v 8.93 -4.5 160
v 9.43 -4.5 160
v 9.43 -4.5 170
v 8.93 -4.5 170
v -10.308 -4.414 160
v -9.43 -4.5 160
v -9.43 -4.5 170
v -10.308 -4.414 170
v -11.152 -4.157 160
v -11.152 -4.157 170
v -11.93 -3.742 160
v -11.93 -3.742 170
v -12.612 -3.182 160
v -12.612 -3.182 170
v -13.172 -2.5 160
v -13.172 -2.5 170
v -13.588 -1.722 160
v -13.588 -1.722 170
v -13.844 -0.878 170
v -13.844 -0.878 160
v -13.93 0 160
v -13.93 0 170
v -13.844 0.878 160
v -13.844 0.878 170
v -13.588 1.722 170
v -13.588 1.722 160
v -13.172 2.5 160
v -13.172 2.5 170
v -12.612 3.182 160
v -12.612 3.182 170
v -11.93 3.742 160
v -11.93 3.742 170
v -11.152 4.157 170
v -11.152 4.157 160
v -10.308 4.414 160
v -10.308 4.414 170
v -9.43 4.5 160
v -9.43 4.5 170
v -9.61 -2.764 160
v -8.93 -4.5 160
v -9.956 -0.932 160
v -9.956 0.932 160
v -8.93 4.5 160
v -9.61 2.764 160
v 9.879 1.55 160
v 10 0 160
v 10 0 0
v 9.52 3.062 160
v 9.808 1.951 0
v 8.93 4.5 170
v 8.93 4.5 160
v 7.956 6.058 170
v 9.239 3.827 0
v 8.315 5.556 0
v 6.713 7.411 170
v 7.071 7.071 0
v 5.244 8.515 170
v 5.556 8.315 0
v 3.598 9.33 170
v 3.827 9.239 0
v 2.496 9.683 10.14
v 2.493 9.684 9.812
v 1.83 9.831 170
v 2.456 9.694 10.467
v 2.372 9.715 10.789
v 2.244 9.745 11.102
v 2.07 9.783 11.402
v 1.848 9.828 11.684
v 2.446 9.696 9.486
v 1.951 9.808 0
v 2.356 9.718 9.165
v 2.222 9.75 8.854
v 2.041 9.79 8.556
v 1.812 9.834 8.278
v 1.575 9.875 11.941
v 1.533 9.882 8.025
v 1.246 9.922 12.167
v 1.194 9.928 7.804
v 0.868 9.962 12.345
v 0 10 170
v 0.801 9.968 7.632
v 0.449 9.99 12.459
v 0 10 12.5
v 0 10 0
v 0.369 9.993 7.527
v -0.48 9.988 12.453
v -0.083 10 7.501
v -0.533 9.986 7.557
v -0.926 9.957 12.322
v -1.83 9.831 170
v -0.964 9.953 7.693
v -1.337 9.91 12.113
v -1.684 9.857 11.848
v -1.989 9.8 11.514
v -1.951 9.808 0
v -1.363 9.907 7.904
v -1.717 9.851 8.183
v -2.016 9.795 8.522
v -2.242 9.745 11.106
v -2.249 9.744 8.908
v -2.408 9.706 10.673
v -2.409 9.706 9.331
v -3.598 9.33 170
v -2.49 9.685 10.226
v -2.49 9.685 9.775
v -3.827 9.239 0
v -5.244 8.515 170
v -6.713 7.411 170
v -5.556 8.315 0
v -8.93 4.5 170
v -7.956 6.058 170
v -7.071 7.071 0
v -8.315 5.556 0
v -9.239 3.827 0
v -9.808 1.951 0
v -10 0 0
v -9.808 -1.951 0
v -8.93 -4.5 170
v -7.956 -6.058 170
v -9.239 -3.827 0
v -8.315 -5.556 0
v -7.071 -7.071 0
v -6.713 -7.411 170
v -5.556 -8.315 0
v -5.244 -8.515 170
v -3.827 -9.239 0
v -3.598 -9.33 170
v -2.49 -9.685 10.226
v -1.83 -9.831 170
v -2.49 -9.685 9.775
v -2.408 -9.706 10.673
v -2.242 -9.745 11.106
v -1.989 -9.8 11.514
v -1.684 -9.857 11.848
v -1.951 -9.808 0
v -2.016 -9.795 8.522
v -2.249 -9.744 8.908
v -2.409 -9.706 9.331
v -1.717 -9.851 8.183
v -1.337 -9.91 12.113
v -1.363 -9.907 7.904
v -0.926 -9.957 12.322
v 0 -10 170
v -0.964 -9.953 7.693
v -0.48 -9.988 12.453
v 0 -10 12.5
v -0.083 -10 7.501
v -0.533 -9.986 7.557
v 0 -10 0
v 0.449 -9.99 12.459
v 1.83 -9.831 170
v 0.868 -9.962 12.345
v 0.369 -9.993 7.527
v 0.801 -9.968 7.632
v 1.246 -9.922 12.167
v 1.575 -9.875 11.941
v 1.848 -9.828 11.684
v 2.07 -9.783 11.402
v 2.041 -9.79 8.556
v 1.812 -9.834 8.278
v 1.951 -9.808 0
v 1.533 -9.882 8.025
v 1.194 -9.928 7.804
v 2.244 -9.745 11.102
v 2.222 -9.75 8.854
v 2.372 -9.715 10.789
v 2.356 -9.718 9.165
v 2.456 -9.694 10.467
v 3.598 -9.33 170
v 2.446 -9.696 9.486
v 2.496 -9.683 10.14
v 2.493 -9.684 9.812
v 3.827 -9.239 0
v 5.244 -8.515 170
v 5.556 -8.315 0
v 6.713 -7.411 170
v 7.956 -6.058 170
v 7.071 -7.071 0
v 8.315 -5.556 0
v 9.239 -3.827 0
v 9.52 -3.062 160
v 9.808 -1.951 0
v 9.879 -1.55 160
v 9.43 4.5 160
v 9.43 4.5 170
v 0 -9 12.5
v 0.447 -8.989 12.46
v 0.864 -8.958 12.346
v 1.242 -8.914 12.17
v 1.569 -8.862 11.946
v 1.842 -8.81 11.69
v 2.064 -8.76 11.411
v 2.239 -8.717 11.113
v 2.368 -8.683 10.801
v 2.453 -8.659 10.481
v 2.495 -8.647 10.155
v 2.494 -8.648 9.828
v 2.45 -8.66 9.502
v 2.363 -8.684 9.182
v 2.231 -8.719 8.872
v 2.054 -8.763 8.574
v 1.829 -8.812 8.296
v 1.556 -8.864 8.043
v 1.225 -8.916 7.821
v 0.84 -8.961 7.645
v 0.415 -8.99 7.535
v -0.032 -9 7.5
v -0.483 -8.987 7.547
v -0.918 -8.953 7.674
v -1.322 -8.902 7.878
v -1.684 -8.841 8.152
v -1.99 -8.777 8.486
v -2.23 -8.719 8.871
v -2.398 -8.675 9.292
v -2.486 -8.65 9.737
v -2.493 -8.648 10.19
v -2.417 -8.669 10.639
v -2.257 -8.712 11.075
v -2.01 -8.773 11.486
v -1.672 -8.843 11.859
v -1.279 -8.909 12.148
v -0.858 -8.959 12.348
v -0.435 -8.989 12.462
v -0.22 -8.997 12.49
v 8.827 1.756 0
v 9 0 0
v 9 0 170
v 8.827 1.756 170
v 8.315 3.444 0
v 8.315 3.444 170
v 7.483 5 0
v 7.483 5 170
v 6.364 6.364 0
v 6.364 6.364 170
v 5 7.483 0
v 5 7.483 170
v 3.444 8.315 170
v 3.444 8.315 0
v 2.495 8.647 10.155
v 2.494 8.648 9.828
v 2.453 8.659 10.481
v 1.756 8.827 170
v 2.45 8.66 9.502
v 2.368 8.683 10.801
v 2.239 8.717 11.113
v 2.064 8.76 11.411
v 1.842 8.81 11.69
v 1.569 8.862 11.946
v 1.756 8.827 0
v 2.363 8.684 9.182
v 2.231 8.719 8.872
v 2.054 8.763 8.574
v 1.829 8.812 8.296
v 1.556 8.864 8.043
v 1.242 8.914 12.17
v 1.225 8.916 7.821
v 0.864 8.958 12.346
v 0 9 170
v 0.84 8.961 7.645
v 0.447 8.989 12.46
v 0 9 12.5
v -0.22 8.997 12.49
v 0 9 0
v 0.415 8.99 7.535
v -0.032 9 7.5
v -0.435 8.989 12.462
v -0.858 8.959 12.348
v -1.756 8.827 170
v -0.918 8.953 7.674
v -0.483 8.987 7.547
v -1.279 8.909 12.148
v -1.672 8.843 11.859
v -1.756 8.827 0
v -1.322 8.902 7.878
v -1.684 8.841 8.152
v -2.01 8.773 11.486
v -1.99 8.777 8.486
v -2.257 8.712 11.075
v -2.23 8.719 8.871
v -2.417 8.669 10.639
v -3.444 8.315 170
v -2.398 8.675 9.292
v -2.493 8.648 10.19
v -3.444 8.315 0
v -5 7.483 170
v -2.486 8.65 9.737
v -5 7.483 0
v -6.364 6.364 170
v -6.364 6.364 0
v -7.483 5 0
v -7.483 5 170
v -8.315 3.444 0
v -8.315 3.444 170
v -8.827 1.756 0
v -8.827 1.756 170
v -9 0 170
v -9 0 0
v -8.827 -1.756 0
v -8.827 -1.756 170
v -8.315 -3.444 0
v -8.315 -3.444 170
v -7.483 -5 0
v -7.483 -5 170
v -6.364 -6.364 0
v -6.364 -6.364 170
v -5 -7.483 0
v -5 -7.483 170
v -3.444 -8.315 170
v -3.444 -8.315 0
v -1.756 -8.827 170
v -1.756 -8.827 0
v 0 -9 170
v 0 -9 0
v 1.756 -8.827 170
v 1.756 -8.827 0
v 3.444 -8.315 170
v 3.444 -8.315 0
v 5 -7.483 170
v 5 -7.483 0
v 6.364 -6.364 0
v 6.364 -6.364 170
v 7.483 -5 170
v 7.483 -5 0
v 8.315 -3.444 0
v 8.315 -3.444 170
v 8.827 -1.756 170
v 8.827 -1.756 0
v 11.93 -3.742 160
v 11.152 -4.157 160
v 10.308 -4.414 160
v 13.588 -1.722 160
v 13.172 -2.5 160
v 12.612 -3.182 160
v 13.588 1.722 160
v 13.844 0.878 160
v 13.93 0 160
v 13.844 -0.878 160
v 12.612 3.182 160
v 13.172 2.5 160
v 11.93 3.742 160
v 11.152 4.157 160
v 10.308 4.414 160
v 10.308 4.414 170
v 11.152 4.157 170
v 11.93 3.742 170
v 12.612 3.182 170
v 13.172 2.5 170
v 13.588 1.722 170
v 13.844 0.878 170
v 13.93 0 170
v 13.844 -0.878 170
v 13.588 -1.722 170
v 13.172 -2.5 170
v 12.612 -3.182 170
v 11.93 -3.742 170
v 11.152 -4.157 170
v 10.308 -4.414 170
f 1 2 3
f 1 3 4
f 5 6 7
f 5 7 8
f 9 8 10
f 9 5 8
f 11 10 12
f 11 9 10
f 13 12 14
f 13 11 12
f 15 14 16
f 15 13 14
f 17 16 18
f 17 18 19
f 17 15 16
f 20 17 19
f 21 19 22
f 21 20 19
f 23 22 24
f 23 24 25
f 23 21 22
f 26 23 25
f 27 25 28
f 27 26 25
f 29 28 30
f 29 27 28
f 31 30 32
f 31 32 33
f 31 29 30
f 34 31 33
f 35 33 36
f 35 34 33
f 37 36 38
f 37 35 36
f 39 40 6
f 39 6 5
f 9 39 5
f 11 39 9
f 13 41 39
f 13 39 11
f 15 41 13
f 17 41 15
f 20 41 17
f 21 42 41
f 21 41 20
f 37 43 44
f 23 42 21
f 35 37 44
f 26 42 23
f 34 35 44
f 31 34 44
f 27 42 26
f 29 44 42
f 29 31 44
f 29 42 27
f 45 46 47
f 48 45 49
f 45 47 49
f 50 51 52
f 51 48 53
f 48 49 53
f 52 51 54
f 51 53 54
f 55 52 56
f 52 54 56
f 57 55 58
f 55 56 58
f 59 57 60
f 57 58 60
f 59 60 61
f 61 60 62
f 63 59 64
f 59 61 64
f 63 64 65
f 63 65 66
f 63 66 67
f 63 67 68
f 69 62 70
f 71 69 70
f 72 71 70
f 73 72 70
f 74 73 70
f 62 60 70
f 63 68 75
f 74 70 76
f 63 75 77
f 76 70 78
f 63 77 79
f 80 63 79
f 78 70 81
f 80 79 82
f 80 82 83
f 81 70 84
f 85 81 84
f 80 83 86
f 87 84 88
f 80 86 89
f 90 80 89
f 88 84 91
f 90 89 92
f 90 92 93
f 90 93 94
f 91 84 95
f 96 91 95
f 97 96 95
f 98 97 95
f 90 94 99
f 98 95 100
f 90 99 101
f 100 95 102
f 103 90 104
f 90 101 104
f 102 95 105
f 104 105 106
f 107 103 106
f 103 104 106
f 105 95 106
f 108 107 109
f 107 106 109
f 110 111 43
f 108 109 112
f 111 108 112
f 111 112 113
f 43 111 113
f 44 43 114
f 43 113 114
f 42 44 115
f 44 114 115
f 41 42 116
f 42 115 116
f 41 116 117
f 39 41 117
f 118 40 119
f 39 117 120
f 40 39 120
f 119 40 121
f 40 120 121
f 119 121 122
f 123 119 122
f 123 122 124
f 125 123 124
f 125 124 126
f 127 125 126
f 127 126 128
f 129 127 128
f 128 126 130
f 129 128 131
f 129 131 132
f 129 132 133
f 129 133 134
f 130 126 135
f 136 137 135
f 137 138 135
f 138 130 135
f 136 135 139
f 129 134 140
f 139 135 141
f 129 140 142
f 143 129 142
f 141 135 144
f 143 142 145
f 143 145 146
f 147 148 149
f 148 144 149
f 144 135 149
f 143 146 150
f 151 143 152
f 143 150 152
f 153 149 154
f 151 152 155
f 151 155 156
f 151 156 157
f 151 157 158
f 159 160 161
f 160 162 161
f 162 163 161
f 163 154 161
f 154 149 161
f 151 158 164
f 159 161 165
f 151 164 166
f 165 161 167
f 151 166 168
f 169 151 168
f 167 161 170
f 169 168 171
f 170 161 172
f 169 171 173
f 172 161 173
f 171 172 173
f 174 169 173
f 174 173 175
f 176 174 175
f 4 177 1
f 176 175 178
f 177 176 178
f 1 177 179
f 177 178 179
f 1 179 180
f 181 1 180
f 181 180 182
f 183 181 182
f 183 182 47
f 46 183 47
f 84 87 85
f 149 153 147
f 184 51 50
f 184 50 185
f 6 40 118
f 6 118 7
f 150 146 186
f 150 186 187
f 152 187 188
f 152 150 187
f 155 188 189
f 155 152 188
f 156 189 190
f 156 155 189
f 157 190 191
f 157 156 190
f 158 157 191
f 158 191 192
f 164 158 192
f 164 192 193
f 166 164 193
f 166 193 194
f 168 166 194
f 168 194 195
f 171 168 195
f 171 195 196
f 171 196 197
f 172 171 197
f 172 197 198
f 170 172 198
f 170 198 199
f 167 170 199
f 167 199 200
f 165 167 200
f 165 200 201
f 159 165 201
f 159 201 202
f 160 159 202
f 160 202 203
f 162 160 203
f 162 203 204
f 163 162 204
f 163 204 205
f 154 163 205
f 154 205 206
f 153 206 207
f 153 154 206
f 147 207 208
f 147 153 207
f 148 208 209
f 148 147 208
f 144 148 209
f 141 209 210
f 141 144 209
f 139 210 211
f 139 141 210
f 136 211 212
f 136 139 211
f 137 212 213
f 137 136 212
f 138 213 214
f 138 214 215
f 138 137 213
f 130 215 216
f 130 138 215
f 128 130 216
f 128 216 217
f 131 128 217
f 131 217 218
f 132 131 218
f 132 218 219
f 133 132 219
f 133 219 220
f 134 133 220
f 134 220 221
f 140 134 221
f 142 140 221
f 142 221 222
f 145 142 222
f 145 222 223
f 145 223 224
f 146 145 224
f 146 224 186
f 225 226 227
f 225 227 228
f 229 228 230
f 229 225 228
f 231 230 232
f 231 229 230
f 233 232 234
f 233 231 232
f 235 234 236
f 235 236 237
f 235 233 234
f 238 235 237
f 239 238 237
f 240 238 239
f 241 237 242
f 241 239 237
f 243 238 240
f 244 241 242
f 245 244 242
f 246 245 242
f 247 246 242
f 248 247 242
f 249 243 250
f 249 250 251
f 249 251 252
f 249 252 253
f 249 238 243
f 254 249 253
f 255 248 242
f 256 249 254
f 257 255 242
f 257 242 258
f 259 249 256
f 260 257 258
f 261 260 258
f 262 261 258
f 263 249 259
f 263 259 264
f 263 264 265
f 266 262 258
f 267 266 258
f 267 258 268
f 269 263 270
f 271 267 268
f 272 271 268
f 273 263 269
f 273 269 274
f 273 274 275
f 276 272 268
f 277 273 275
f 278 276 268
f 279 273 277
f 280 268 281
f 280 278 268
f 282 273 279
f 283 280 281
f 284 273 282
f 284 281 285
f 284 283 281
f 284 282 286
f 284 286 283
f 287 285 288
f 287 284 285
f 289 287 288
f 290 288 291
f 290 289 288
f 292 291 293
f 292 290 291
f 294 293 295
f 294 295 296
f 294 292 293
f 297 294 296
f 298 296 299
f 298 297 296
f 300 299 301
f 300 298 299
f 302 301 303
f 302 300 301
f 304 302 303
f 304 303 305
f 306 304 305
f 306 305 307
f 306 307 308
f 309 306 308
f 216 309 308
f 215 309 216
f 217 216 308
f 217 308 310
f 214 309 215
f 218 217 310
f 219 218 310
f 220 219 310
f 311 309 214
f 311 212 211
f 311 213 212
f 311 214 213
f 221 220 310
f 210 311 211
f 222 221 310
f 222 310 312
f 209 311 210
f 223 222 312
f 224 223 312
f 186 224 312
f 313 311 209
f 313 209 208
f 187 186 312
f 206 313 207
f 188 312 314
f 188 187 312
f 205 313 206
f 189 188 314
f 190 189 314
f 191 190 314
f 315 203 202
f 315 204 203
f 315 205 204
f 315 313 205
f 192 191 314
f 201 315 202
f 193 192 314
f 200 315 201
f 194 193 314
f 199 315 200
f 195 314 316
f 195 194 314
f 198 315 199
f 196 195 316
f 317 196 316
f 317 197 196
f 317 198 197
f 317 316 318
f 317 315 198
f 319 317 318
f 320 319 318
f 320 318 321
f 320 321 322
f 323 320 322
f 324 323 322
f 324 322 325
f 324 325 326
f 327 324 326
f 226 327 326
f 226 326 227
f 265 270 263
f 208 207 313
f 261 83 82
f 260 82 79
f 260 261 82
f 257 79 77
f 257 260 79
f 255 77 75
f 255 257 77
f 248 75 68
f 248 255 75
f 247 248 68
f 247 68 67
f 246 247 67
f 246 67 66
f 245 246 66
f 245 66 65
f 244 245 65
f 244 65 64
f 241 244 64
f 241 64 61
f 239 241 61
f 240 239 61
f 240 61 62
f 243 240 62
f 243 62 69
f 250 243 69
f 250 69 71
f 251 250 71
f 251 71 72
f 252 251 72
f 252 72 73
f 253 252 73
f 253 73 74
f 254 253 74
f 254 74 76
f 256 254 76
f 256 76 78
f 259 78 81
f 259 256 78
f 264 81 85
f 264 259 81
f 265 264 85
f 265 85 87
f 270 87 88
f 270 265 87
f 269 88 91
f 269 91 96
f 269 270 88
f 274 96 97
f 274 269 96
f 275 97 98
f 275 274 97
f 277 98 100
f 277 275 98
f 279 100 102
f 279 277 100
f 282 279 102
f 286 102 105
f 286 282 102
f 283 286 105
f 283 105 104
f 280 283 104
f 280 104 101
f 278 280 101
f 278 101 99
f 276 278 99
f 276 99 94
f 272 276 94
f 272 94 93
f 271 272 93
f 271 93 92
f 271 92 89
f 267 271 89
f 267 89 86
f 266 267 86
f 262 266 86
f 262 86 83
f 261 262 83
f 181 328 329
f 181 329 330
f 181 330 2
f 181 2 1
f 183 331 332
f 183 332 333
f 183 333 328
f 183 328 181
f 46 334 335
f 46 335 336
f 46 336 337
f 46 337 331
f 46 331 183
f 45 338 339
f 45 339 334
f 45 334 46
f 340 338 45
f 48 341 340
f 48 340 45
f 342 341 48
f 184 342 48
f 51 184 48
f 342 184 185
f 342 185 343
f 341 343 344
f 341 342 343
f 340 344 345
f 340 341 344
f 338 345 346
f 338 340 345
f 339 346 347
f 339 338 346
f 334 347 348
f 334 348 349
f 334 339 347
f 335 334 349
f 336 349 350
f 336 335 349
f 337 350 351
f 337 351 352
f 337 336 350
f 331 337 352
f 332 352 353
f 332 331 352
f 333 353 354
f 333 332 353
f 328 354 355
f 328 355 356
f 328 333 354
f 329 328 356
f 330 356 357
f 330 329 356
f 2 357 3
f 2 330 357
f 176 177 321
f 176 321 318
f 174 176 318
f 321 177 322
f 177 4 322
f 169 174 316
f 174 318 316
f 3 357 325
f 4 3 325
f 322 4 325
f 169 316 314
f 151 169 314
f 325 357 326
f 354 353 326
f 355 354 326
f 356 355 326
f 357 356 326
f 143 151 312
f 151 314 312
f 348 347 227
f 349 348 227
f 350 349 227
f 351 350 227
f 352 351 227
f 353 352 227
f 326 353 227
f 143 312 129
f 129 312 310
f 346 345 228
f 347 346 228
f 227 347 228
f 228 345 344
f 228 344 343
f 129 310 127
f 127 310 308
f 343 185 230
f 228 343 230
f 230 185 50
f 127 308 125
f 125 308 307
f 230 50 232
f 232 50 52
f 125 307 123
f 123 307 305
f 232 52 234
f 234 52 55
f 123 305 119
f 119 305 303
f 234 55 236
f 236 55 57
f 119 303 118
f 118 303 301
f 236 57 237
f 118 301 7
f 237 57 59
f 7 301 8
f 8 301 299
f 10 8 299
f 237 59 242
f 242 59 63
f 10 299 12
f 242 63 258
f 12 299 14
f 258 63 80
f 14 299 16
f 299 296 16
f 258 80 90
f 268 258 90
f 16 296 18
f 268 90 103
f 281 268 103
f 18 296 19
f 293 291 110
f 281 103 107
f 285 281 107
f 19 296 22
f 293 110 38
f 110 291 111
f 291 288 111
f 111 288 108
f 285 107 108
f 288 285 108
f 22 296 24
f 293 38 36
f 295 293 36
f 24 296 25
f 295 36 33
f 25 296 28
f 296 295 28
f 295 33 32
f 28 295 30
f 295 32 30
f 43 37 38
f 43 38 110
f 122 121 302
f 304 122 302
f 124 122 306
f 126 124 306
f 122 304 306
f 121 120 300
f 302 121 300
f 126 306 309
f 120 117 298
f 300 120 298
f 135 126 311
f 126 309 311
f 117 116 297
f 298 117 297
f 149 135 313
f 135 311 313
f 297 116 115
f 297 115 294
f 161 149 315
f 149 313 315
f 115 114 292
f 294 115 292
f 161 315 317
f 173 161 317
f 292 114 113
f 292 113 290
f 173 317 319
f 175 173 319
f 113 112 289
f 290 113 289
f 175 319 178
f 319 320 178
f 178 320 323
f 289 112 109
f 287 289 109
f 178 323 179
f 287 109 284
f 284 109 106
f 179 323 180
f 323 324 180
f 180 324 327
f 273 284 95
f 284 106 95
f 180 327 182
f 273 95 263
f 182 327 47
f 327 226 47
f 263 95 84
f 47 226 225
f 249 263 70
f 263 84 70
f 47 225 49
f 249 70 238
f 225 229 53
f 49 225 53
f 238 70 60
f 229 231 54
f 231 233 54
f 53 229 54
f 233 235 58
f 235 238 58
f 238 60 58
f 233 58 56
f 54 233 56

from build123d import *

# Parameters (mm, degrees)
SKETCH1_R               = 10
SKETCH1_R_2             = 9
BOSS_EXTRUDE1_DEPTH     = 170
BOSS_EXTRUDE2_START     = -10
BOSS_EXTRUDE2_DEPTH     = 10
CUT_EXTRUDE1_DEPTH      = 171.862672505
CUT_EXTRUDE1_DEPTH_BACK = 171.862672505
SKETCH3_R               = 2.5


with BuildPart() as part:
    # Sketch1 → Boss-Extrude1 (new body)
    with BuildSketch(Plane.XY):
        Circle(SKETCH1_R)
        Circle(SKETCH1_R_2, mode=Mode.SUBTRACT)
    extrude(amount=BOSS_EXTRUDE1_DEPTH)

    # Sketch2 → Boss-Extrude2 (add)
    with BuildSketch(Plane.XY.offset(170).offset(BOSS_EXTRUDE2_START)):
        with BuildLine():
            Line((-9.43028555, 4.5), (-8.93028555, 4.5))
            ThreePointArc((-8.93028555, 4.5), (-10, 0), (-8.93028555, -4.5))
            Line((-8.93028555, -4.5), (-9.43028555, -4.5))
            ThreePointArc((-9.43028555, -4.5), (-13.93028555, 0), (-9.43028555, 4.5))
        make_face()
        with BuildLine():
            Line((8.93028555, 4.5), (9.43028555, 4.5))
            ThreePointArc((9.43028555, 4.5), (13.93028555, 0), (9.43028555, -4.5))
            Line((9.43028555, -4.5), (8.93028555, -4.5))
            ThreePointArc((8.93028555, -4.5), (10, 0), (8.93028555, 4.5))
        make_face()
    extrude(amount=BOSS_EXTRUDE2_DEPTH)

    # Sketch3 → Cut-Extrude1 (cut, two sides: drawn at the far end of the back side and taken through both)
    with BuildSketch(Plane(origin=(0, 0, 0), x_dir=(1, 0, 0), z_dir=(0, 1, 0)).offset(-CUT_EXTRUDE1_DEPTH_BACK)):
        with Locations(Location((0, -10, 0), (0, 0, 270))):
            Circle(SKETCH3_R)
    extrude(amount=CUT_EXTRUDE1_DEPTH + CUT_EXTRUDE1_DEPTH_BACK, mode=Mode.SUBTRACT)


solid = part.part
